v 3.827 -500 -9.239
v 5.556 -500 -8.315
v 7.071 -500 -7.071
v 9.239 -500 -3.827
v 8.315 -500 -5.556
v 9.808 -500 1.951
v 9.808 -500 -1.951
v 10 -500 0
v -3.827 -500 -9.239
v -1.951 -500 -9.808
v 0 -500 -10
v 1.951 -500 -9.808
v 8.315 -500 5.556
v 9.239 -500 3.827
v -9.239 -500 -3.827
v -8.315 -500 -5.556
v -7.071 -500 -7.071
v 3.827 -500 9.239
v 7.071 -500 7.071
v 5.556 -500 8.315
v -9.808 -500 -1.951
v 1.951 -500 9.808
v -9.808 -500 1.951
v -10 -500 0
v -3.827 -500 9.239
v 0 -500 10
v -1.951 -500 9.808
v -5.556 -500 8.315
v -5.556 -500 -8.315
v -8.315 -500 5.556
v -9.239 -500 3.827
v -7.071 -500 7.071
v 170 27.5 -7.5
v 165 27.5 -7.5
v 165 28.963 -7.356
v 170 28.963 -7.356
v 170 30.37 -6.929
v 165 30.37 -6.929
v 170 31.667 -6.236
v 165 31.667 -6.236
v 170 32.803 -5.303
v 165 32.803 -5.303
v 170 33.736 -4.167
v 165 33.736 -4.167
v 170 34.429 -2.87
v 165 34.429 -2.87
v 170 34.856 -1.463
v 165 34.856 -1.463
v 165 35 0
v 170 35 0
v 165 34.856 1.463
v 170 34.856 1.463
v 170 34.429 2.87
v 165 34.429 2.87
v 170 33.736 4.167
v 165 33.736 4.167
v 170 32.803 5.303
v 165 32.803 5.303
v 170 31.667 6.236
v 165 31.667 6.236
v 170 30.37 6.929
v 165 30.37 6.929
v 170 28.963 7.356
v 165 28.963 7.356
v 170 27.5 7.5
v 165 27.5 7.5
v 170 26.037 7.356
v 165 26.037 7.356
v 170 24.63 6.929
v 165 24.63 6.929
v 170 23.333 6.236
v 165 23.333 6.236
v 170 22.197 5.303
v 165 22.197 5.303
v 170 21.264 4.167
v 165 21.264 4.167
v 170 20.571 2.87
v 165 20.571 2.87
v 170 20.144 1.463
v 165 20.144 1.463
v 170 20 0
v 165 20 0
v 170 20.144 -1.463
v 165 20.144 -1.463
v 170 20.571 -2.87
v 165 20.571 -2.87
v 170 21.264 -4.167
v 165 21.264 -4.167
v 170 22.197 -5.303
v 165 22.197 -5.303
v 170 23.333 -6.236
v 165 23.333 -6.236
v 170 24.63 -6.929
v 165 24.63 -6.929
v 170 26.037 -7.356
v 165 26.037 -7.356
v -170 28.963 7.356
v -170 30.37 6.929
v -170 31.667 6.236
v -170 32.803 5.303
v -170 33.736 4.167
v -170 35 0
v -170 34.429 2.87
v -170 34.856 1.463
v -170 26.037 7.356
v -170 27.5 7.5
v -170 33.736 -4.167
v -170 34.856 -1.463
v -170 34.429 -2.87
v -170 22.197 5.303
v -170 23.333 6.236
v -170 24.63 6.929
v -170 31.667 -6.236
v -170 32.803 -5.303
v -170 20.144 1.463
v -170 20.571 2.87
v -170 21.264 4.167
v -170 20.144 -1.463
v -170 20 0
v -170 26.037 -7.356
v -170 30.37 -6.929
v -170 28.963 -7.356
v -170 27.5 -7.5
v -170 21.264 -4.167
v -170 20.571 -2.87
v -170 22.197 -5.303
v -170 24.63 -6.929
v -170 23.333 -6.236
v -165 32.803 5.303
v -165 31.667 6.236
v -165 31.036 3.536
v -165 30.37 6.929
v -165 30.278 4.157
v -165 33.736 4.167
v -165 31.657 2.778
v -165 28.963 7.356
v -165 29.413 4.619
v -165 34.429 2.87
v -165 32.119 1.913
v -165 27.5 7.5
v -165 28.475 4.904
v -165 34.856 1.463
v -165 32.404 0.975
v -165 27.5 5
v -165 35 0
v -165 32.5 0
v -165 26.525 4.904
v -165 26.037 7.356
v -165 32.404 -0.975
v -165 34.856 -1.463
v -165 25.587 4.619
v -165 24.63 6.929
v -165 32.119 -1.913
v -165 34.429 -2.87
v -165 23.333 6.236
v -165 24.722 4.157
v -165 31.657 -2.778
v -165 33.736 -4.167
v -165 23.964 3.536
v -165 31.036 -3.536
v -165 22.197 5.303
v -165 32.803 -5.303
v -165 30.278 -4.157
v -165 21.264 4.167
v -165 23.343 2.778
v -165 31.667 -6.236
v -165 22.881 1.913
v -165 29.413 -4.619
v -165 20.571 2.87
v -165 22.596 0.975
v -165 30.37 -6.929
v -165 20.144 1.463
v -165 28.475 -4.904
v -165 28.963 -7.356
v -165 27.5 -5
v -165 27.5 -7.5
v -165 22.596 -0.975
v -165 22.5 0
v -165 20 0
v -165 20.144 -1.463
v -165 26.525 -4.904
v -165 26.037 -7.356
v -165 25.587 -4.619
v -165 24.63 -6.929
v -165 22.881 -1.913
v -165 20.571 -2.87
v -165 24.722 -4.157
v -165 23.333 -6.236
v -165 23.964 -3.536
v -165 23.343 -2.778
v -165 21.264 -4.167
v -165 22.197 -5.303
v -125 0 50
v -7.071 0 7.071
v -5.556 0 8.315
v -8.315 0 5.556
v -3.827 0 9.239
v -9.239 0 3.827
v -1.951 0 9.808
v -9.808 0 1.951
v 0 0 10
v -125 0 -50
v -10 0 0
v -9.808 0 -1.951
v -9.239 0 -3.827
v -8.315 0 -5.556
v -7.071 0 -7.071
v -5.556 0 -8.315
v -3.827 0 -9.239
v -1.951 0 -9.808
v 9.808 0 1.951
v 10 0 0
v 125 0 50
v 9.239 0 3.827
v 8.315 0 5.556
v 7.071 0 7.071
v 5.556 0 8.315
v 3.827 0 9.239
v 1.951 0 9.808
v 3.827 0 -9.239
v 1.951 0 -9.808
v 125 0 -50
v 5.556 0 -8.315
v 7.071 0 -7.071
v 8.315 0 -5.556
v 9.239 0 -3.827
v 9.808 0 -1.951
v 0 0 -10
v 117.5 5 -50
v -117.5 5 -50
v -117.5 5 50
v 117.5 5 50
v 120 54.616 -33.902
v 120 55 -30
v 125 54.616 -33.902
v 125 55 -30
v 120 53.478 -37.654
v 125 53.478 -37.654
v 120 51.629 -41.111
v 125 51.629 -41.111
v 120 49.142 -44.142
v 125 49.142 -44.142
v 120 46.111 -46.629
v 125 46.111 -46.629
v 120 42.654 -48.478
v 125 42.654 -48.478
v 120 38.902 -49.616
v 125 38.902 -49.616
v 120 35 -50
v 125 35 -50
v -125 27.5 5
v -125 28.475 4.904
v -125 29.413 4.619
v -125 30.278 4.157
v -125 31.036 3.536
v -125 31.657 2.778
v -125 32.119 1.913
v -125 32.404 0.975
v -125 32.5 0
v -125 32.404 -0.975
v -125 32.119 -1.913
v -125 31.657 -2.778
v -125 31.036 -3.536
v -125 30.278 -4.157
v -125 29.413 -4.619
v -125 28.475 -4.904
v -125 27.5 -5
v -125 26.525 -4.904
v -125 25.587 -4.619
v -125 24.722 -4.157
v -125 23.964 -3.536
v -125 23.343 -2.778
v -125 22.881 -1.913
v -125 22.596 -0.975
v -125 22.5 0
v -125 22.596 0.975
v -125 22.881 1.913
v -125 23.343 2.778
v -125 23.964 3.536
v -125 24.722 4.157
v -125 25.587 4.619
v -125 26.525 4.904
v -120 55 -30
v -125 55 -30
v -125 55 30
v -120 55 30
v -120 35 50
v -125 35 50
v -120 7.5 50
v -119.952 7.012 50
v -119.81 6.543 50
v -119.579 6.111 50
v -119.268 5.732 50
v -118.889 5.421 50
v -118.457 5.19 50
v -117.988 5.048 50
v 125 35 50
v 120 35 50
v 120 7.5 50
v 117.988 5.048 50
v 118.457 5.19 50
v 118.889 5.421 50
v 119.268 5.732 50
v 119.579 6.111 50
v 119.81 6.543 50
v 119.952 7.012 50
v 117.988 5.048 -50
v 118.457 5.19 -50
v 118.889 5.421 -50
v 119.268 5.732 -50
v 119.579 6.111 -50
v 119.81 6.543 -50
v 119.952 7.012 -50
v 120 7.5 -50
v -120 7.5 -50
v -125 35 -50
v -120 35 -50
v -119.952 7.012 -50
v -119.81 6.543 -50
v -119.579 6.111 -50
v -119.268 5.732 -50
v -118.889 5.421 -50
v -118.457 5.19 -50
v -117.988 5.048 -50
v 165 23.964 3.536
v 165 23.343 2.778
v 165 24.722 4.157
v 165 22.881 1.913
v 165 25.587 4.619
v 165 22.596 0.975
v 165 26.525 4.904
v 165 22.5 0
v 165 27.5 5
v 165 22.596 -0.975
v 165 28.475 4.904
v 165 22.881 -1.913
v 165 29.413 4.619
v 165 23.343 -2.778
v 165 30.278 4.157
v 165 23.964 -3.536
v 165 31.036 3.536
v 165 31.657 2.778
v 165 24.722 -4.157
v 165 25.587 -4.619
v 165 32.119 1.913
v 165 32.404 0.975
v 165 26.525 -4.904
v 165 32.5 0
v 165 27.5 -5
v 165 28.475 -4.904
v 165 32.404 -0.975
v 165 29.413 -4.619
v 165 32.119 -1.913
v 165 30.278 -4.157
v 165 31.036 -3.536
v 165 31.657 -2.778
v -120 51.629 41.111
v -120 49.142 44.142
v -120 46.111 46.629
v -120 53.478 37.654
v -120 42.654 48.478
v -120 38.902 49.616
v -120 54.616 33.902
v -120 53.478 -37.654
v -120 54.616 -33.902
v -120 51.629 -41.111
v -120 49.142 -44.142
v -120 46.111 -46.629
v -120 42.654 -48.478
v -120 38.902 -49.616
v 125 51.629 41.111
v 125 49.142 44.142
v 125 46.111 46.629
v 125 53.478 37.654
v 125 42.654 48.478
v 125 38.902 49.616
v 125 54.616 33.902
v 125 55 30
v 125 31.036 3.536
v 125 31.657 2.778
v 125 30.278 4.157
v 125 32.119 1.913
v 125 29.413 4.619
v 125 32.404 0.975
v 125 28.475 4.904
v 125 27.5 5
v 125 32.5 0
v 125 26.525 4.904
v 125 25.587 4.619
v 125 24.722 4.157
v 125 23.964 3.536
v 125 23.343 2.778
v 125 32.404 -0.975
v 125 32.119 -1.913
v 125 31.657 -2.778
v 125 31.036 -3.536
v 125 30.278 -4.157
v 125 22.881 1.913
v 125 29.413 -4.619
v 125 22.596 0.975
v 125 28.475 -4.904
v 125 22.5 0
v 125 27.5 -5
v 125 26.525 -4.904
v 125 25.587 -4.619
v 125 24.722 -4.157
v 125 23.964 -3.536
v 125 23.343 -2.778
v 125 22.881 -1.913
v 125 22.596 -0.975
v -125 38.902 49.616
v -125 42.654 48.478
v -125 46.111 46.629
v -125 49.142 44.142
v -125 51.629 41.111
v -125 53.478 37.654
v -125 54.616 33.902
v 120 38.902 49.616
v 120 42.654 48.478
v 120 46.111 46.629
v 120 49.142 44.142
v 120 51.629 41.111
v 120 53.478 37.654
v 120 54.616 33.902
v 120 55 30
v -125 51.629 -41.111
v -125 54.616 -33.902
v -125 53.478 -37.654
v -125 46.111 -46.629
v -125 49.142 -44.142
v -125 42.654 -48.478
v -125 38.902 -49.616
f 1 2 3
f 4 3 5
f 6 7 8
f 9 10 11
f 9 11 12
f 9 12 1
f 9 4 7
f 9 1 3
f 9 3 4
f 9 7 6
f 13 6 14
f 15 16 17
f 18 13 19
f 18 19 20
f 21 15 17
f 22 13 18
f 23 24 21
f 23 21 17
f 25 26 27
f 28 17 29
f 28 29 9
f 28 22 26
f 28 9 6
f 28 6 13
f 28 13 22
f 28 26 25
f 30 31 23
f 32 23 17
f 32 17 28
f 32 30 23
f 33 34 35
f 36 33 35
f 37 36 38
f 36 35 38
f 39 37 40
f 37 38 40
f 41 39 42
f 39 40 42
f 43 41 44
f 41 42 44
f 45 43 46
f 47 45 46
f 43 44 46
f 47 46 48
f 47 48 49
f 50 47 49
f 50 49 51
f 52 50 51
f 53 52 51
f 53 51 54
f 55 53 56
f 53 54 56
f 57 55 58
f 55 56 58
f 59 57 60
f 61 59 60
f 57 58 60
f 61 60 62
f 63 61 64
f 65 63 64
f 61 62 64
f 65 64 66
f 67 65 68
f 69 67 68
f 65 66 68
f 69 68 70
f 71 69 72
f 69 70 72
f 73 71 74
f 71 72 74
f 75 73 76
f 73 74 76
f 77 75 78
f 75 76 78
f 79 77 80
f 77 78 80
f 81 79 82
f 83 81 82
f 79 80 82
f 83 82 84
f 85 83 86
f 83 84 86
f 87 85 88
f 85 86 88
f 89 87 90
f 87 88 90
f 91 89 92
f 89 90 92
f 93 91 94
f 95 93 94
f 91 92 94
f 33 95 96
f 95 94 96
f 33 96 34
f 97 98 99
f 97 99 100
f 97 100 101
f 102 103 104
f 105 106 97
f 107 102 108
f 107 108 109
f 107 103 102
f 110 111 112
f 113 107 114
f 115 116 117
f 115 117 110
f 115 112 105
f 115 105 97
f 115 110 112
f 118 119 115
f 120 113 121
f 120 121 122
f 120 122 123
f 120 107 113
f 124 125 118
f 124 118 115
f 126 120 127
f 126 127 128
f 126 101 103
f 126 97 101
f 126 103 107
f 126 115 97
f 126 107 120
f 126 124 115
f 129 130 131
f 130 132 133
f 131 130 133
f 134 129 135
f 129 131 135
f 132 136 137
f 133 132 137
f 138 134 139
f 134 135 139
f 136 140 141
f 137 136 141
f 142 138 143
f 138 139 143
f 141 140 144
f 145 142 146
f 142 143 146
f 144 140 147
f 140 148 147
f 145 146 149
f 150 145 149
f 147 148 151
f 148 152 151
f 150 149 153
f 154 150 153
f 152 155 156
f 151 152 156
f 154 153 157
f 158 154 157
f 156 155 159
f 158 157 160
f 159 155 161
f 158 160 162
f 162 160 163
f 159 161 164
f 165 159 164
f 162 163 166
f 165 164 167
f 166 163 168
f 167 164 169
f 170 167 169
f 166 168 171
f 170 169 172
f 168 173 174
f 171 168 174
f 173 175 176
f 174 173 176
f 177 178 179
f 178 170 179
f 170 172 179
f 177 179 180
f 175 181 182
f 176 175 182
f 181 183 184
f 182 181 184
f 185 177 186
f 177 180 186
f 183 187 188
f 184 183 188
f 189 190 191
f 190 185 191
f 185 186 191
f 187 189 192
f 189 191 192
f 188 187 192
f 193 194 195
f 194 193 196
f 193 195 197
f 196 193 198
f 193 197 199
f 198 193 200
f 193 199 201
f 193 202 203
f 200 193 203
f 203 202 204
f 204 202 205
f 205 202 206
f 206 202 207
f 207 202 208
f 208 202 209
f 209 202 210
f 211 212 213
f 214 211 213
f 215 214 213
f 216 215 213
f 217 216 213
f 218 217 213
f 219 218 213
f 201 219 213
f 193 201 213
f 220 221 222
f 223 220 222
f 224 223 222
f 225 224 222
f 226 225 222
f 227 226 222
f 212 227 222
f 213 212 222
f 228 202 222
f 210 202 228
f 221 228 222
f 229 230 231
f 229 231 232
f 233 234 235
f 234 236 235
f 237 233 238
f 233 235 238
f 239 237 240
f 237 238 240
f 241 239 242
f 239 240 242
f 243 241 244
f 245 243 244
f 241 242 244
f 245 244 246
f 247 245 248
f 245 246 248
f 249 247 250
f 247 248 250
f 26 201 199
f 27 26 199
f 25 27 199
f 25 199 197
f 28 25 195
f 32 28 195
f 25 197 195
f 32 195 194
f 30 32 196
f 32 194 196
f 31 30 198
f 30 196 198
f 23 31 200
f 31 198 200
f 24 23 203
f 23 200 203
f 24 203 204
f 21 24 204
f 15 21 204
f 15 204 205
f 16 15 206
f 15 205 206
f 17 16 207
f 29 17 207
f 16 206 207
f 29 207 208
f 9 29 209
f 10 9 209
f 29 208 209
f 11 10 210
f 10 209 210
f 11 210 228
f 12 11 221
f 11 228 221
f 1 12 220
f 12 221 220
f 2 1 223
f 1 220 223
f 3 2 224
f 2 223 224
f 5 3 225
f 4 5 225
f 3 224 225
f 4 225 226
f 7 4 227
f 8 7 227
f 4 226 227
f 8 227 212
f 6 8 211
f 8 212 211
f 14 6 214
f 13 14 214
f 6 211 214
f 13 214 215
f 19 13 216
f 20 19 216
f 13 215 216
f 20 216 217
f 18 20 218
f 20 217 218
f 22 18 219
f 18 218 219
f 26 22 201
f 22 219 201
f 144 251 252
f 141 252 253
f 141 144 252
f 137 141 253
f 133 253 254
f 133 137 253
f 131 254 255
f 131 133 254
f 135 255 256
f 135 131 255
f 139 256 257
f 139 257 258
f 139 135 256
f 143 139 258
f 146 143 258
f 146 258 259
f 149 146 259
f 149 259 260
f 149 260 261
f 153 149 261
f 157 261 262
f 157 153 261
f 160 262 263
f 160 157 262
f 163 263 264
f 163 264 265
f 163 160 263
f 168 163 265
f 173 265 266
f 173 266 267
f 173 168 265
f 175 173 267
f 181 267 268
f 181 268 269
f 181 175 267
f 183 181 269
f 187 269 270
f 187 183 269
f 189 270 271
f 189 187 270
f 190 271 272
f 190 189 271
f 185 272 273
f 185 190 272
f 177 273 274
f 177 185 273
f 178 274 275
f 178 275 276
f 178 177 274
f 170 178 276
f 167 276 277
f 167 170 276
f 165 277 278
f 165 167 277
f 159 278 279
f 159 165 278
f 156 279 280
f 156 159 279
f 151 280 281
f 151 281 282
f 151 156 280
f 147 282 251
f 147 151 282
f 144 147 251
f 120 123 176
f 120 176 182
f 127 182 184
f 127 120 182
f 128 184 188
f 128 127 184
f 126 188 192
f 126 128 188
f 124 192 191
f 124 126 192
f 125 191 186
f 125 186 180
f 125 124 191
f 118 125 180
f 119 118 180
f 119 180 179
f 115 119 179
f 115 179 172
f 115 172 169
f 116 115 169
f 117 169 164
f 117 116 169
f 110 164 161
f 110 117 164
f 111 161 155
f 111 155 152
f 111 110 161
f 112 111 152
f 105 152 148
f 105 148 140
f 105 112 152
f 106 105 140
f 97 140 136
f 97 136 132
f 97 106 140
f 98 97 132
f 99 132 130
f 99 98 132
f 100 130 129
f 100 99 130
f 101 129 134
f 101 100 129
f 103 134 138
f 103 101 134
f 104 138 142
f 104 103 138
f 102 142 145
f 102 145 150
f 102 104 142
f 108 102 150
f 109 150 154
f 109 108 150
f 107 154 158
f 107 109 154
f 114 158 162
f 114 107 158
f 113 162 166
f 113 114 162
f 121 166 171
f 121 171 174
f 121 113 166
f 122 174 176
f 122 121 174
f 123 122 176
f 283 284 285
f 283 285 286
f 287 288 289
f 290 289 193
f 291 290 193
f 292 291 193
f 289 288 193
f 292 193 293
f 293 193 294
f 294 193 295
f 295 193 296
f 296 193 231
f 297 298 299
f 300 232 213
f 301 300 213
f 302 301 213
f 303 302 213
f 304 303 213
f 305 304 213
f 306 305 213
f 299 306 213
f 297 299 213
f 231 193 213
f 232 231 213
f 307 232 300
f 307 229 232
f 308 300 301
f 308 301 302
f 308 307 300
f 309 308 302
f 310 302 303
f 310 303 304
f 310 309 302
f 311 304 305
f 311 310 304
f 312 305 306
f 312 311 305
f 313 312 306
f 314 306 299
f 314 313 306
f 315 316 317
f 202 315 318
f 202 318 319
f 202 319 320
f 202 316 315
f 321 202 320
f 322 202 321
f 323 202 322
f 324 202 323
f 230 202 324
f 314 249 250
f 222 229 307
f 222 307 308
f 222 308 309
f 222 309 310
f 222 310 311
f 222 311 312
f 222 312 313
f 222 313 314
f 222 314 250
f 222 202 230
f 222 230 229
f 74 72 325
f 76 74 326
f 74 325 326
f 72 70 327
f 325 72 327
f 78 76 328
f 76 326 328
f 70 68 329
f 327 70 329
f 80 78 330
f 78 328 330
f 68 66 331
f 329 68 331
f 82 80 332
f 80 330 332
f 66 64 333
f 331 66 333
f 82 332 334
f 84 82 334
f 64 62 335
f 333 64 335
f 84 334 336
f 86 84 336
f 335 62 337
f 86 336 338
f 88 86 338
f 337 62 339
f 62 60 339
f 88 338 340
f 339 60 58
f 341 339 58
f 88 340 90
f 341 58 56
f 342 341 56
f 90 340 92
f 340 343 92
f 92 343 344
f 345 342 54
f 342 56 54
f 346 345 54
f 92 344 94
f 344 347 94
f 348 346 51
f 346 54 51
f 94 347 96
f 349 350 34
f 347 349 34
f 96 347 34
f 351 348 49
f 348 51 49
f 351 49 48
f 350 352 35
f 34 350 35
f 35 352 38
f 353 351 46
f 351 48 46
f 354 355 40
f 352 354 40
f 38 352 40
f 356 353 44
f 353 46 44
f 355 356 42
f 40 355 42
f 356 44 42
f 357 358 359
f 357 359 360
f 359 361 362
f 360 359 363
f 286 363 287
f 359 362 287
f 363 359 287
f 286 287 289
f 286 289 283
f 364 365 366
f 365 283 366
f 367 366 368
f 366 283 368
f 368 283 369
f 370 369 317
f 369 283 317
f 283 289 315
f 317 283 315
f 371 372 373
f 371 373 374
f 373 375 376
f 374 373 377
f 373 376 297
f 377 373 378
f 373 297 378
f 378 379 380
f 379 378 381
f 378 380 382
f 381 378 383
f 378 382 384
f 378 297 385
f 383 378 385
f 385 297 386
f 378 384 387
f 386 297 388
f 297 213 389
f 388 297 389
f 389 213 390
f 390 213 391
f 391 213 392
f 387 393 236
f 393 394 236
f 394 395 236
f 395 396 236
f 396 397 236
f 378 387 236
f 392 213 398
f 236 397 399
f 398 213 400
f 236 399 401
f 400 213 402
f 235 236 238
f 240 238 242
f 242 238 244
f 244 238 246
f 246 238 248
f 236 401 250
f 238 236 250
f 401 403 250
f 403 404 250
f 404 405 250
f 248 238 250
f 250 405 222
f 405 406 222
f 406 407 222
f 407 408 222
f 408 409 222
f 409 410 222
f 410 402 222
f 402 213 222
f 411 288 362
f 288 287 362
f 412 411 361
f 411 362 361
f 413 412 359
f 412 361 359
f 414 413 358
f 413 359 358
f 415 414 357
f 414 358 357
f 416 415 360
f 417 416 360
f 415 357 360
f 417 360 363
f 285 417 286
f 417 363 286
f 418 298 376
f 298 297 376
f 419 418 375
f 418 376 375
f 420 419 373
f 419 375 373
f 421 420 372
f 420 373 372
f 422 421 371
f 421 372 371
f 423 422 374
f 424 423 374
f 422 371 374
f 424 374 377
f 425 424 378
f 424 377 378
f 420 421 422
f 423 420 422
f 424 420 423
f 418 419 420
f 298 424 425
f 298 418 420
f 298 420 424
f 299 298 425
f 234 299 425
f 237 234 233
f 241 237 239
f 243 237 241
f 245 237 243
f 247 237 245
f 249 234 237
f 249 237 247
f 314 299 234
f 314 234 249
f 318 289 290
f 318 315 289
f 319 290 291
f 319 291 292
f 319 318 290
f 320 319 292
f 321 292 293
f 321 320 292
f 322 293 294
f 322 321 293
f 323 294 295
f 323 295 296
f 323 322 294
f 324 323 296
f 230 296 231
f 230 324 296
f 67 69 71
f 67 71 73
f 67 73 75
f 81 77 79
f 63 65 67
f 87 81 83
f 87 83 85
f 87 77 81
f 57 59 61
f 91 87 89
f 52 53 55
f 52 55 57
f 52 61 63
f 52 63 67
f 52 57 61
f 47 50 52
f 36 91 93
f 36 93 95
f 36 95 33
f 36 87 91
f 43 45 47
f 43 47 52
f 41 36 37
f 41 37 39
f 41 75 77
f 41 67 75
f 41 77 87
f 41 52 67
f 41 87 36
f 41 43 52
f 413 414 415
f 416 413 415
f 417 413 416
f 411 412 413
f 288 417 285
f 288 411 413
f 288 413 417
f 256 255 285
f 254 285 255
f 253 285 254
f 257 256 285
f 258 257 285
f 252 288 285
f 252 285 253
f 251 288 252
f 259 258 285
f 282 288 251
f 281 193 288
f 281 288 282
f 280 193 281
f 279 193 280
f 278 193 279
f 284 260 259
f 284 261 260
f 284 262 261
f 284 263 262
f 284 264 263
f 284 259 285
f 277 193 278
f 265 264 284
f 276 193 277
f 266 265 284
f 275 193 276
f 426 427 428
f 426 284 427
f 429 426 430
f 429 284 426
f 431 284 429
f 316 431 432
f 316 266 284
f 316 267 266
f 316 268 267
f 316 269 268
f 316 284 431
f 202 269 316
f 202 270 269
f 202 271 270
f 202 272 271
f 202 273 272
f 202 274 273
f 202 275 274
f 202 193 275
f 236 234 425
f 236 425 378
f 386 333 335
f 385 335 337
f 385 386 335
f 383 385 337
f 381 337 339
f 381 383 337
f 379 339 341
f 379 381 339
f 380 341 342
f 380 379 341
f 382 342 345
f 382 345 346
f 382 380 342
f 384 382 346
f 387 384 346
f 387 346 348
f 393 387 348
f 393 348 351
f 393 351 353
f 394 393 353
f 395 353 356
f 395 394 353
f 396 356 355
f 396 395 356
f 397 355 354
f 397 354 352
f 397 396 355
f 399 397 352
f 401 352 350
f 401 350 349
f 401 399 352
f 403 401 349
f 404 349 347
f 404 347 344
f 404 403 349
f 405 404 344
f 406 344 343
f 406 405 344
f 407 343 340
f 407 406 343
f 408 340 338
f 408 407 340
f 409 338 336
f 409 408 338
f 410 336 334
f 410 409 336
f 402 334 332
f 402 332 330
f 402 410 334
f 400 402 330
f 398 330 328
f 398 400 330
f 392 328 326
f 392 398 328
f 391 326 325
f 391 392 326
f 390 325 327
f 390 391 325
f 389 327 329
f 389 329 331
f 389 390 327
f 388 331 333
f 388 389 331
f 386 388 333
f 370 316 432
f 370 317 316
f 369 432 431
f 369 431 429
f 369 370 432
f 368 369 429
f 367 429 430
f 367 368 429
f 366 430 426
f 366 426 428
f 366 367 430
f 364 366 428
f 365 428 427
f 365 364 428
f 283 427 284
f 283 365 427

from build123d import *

# Parameters (mm, degrees)
SKETCH1_W            = 250
SKETCH1_H            = 100
BOSS_EXTRUDE1_DEPTH  = 5
SKETCH2_W            = 5
SKETCH2_H            = 100
BOSS_EXTRUDE2_DEPTH  = 50
FILLET1_R            = 20
BOSS_EXTRUDE3_START  = -250
SKETCH3_R            = 5
BOSS_EXTRUDE3_DEPTH  = 40
BOSS_EXTRUDE4_START  = 40
SKETCH3_2_R          = 5
BOSS_EXTRUDE4_DEPTH  = 40
SKETCH4_R            = 10
BOSS_EXTRUDE5_DEPTH  = 500
SKETCH6_R            = 7.5
BOSS_EXTRUDE9_DEPTH  = 5
BOSS_EXTRUDE11_START = 5
SKETCH7_R            = 7.5
BOSS_EXTRUDE11_DEPTH = 5
FILLET3_R            = 2.5


with BuildPart() as part:
    # Sketch1 → Boss-Extrude1 (new body)
    with BuildSketch(Plane(origin=(0, 0, 0), x_dir=(1, 0, 0), z_dir=(0, 1, 0))):
        Rectangle(SKETCH1_W, SKETCH1_H)
    extrude(amount=BOSS_EXTRUDE1_DEPTH)

    # Sketch2 → Boss-Extrude2 (add)
    with BuildSketch(Plane(origin=(0, 5, 0), x_dir=(1, 0, 0), z_dir=(0, 1, 0))):
        with Locations((-122.5, 0)):
            Rectangle(SKETCH2_W, SKETCH2_H)
        with Locations((122.5, 0)):
            Rectangle(SKETCH2_W, SKETCH2_H)
    extrude(amount=BOSS_EXTRUDE2_DEPTH)

    # Fillet1
    fillet1_edges = [part.edges().sort_by_distance(p)[0] for p in [
        (122.5, 55, -50),
        (122.5, 55, 50),
        (-122.5, 55, -50),
        (-122.5, 55, 50),
    ]]
    fillet(fillet1_edges, radius=FILLET1_R)

    # Sketch3 → Boss-Extrude3 (add)
    with BuildSketch(Plane.ZY.offset(125).offset(BOSS_EXTRUDE3_START)):
        with Locations((0, 27.5)):
            Circle(SKETCH3_R)
    extrude(amount=-BOSS_EXTRUDE3_DEPTH)

    # Sketch3<2> → Boss-Extrude4 (add)
    with BuildSketch(Plane.ZY.offset(125).offset(BOSS_EXTRUDE4_START)):
        with Locations((0, 27.5)):
            Circle(SKETCH3_2_R)
    extrude(amount=-BOSS_EXTRUDE4_DEPTH)

    # Sketch4 → Boss-Extrude5 (add)
    with BuildSketch(Plane(origin=(0, 0, 0), x_dir=(-1, 0, 0), z_dir=(0, -1, 0))):
        with Locations(Location((0, 0, 0), (0, 0, 270))):
            Circle(SKETCH4_R)
    extrude(amount=BOSS_EXTRUDE5_DEPTH)

    # Sketch6 → Boss-Extrude9 (add)
    with BuildSketch(Plane(origin=(165, 0, 0), x_dir=(0, 0, -1), z_dir=(1, 0, 0))):
        with Locations((0, 27.5)):
            Circle(SKETCH6_R)
    extrude(amount=BOSS_EXTRUDE9_DEPTH)

    # Sketch7 → Boss-Extrude11 (add)
    with BuildSketch(Plane.ZY.offset(165).offset(BOSS_EXTRUDE11_START)):
        with Locations(Location((0, 27.5, 0), (0, 0, 180))):
            Circle(SKETCH7_R)
    extrude(amount=-BOSS_EXTRUDE11_DEPTH)

    # Fillet3
    fillet3_edges = [part.edges().sort_by_distance(p)[0] for p in [
        (-120, 5, 0),
        (120, 5, 0),
    ]]
    fillet(fillet3_edges, radius=FILLET3_R)


solid = part.part
